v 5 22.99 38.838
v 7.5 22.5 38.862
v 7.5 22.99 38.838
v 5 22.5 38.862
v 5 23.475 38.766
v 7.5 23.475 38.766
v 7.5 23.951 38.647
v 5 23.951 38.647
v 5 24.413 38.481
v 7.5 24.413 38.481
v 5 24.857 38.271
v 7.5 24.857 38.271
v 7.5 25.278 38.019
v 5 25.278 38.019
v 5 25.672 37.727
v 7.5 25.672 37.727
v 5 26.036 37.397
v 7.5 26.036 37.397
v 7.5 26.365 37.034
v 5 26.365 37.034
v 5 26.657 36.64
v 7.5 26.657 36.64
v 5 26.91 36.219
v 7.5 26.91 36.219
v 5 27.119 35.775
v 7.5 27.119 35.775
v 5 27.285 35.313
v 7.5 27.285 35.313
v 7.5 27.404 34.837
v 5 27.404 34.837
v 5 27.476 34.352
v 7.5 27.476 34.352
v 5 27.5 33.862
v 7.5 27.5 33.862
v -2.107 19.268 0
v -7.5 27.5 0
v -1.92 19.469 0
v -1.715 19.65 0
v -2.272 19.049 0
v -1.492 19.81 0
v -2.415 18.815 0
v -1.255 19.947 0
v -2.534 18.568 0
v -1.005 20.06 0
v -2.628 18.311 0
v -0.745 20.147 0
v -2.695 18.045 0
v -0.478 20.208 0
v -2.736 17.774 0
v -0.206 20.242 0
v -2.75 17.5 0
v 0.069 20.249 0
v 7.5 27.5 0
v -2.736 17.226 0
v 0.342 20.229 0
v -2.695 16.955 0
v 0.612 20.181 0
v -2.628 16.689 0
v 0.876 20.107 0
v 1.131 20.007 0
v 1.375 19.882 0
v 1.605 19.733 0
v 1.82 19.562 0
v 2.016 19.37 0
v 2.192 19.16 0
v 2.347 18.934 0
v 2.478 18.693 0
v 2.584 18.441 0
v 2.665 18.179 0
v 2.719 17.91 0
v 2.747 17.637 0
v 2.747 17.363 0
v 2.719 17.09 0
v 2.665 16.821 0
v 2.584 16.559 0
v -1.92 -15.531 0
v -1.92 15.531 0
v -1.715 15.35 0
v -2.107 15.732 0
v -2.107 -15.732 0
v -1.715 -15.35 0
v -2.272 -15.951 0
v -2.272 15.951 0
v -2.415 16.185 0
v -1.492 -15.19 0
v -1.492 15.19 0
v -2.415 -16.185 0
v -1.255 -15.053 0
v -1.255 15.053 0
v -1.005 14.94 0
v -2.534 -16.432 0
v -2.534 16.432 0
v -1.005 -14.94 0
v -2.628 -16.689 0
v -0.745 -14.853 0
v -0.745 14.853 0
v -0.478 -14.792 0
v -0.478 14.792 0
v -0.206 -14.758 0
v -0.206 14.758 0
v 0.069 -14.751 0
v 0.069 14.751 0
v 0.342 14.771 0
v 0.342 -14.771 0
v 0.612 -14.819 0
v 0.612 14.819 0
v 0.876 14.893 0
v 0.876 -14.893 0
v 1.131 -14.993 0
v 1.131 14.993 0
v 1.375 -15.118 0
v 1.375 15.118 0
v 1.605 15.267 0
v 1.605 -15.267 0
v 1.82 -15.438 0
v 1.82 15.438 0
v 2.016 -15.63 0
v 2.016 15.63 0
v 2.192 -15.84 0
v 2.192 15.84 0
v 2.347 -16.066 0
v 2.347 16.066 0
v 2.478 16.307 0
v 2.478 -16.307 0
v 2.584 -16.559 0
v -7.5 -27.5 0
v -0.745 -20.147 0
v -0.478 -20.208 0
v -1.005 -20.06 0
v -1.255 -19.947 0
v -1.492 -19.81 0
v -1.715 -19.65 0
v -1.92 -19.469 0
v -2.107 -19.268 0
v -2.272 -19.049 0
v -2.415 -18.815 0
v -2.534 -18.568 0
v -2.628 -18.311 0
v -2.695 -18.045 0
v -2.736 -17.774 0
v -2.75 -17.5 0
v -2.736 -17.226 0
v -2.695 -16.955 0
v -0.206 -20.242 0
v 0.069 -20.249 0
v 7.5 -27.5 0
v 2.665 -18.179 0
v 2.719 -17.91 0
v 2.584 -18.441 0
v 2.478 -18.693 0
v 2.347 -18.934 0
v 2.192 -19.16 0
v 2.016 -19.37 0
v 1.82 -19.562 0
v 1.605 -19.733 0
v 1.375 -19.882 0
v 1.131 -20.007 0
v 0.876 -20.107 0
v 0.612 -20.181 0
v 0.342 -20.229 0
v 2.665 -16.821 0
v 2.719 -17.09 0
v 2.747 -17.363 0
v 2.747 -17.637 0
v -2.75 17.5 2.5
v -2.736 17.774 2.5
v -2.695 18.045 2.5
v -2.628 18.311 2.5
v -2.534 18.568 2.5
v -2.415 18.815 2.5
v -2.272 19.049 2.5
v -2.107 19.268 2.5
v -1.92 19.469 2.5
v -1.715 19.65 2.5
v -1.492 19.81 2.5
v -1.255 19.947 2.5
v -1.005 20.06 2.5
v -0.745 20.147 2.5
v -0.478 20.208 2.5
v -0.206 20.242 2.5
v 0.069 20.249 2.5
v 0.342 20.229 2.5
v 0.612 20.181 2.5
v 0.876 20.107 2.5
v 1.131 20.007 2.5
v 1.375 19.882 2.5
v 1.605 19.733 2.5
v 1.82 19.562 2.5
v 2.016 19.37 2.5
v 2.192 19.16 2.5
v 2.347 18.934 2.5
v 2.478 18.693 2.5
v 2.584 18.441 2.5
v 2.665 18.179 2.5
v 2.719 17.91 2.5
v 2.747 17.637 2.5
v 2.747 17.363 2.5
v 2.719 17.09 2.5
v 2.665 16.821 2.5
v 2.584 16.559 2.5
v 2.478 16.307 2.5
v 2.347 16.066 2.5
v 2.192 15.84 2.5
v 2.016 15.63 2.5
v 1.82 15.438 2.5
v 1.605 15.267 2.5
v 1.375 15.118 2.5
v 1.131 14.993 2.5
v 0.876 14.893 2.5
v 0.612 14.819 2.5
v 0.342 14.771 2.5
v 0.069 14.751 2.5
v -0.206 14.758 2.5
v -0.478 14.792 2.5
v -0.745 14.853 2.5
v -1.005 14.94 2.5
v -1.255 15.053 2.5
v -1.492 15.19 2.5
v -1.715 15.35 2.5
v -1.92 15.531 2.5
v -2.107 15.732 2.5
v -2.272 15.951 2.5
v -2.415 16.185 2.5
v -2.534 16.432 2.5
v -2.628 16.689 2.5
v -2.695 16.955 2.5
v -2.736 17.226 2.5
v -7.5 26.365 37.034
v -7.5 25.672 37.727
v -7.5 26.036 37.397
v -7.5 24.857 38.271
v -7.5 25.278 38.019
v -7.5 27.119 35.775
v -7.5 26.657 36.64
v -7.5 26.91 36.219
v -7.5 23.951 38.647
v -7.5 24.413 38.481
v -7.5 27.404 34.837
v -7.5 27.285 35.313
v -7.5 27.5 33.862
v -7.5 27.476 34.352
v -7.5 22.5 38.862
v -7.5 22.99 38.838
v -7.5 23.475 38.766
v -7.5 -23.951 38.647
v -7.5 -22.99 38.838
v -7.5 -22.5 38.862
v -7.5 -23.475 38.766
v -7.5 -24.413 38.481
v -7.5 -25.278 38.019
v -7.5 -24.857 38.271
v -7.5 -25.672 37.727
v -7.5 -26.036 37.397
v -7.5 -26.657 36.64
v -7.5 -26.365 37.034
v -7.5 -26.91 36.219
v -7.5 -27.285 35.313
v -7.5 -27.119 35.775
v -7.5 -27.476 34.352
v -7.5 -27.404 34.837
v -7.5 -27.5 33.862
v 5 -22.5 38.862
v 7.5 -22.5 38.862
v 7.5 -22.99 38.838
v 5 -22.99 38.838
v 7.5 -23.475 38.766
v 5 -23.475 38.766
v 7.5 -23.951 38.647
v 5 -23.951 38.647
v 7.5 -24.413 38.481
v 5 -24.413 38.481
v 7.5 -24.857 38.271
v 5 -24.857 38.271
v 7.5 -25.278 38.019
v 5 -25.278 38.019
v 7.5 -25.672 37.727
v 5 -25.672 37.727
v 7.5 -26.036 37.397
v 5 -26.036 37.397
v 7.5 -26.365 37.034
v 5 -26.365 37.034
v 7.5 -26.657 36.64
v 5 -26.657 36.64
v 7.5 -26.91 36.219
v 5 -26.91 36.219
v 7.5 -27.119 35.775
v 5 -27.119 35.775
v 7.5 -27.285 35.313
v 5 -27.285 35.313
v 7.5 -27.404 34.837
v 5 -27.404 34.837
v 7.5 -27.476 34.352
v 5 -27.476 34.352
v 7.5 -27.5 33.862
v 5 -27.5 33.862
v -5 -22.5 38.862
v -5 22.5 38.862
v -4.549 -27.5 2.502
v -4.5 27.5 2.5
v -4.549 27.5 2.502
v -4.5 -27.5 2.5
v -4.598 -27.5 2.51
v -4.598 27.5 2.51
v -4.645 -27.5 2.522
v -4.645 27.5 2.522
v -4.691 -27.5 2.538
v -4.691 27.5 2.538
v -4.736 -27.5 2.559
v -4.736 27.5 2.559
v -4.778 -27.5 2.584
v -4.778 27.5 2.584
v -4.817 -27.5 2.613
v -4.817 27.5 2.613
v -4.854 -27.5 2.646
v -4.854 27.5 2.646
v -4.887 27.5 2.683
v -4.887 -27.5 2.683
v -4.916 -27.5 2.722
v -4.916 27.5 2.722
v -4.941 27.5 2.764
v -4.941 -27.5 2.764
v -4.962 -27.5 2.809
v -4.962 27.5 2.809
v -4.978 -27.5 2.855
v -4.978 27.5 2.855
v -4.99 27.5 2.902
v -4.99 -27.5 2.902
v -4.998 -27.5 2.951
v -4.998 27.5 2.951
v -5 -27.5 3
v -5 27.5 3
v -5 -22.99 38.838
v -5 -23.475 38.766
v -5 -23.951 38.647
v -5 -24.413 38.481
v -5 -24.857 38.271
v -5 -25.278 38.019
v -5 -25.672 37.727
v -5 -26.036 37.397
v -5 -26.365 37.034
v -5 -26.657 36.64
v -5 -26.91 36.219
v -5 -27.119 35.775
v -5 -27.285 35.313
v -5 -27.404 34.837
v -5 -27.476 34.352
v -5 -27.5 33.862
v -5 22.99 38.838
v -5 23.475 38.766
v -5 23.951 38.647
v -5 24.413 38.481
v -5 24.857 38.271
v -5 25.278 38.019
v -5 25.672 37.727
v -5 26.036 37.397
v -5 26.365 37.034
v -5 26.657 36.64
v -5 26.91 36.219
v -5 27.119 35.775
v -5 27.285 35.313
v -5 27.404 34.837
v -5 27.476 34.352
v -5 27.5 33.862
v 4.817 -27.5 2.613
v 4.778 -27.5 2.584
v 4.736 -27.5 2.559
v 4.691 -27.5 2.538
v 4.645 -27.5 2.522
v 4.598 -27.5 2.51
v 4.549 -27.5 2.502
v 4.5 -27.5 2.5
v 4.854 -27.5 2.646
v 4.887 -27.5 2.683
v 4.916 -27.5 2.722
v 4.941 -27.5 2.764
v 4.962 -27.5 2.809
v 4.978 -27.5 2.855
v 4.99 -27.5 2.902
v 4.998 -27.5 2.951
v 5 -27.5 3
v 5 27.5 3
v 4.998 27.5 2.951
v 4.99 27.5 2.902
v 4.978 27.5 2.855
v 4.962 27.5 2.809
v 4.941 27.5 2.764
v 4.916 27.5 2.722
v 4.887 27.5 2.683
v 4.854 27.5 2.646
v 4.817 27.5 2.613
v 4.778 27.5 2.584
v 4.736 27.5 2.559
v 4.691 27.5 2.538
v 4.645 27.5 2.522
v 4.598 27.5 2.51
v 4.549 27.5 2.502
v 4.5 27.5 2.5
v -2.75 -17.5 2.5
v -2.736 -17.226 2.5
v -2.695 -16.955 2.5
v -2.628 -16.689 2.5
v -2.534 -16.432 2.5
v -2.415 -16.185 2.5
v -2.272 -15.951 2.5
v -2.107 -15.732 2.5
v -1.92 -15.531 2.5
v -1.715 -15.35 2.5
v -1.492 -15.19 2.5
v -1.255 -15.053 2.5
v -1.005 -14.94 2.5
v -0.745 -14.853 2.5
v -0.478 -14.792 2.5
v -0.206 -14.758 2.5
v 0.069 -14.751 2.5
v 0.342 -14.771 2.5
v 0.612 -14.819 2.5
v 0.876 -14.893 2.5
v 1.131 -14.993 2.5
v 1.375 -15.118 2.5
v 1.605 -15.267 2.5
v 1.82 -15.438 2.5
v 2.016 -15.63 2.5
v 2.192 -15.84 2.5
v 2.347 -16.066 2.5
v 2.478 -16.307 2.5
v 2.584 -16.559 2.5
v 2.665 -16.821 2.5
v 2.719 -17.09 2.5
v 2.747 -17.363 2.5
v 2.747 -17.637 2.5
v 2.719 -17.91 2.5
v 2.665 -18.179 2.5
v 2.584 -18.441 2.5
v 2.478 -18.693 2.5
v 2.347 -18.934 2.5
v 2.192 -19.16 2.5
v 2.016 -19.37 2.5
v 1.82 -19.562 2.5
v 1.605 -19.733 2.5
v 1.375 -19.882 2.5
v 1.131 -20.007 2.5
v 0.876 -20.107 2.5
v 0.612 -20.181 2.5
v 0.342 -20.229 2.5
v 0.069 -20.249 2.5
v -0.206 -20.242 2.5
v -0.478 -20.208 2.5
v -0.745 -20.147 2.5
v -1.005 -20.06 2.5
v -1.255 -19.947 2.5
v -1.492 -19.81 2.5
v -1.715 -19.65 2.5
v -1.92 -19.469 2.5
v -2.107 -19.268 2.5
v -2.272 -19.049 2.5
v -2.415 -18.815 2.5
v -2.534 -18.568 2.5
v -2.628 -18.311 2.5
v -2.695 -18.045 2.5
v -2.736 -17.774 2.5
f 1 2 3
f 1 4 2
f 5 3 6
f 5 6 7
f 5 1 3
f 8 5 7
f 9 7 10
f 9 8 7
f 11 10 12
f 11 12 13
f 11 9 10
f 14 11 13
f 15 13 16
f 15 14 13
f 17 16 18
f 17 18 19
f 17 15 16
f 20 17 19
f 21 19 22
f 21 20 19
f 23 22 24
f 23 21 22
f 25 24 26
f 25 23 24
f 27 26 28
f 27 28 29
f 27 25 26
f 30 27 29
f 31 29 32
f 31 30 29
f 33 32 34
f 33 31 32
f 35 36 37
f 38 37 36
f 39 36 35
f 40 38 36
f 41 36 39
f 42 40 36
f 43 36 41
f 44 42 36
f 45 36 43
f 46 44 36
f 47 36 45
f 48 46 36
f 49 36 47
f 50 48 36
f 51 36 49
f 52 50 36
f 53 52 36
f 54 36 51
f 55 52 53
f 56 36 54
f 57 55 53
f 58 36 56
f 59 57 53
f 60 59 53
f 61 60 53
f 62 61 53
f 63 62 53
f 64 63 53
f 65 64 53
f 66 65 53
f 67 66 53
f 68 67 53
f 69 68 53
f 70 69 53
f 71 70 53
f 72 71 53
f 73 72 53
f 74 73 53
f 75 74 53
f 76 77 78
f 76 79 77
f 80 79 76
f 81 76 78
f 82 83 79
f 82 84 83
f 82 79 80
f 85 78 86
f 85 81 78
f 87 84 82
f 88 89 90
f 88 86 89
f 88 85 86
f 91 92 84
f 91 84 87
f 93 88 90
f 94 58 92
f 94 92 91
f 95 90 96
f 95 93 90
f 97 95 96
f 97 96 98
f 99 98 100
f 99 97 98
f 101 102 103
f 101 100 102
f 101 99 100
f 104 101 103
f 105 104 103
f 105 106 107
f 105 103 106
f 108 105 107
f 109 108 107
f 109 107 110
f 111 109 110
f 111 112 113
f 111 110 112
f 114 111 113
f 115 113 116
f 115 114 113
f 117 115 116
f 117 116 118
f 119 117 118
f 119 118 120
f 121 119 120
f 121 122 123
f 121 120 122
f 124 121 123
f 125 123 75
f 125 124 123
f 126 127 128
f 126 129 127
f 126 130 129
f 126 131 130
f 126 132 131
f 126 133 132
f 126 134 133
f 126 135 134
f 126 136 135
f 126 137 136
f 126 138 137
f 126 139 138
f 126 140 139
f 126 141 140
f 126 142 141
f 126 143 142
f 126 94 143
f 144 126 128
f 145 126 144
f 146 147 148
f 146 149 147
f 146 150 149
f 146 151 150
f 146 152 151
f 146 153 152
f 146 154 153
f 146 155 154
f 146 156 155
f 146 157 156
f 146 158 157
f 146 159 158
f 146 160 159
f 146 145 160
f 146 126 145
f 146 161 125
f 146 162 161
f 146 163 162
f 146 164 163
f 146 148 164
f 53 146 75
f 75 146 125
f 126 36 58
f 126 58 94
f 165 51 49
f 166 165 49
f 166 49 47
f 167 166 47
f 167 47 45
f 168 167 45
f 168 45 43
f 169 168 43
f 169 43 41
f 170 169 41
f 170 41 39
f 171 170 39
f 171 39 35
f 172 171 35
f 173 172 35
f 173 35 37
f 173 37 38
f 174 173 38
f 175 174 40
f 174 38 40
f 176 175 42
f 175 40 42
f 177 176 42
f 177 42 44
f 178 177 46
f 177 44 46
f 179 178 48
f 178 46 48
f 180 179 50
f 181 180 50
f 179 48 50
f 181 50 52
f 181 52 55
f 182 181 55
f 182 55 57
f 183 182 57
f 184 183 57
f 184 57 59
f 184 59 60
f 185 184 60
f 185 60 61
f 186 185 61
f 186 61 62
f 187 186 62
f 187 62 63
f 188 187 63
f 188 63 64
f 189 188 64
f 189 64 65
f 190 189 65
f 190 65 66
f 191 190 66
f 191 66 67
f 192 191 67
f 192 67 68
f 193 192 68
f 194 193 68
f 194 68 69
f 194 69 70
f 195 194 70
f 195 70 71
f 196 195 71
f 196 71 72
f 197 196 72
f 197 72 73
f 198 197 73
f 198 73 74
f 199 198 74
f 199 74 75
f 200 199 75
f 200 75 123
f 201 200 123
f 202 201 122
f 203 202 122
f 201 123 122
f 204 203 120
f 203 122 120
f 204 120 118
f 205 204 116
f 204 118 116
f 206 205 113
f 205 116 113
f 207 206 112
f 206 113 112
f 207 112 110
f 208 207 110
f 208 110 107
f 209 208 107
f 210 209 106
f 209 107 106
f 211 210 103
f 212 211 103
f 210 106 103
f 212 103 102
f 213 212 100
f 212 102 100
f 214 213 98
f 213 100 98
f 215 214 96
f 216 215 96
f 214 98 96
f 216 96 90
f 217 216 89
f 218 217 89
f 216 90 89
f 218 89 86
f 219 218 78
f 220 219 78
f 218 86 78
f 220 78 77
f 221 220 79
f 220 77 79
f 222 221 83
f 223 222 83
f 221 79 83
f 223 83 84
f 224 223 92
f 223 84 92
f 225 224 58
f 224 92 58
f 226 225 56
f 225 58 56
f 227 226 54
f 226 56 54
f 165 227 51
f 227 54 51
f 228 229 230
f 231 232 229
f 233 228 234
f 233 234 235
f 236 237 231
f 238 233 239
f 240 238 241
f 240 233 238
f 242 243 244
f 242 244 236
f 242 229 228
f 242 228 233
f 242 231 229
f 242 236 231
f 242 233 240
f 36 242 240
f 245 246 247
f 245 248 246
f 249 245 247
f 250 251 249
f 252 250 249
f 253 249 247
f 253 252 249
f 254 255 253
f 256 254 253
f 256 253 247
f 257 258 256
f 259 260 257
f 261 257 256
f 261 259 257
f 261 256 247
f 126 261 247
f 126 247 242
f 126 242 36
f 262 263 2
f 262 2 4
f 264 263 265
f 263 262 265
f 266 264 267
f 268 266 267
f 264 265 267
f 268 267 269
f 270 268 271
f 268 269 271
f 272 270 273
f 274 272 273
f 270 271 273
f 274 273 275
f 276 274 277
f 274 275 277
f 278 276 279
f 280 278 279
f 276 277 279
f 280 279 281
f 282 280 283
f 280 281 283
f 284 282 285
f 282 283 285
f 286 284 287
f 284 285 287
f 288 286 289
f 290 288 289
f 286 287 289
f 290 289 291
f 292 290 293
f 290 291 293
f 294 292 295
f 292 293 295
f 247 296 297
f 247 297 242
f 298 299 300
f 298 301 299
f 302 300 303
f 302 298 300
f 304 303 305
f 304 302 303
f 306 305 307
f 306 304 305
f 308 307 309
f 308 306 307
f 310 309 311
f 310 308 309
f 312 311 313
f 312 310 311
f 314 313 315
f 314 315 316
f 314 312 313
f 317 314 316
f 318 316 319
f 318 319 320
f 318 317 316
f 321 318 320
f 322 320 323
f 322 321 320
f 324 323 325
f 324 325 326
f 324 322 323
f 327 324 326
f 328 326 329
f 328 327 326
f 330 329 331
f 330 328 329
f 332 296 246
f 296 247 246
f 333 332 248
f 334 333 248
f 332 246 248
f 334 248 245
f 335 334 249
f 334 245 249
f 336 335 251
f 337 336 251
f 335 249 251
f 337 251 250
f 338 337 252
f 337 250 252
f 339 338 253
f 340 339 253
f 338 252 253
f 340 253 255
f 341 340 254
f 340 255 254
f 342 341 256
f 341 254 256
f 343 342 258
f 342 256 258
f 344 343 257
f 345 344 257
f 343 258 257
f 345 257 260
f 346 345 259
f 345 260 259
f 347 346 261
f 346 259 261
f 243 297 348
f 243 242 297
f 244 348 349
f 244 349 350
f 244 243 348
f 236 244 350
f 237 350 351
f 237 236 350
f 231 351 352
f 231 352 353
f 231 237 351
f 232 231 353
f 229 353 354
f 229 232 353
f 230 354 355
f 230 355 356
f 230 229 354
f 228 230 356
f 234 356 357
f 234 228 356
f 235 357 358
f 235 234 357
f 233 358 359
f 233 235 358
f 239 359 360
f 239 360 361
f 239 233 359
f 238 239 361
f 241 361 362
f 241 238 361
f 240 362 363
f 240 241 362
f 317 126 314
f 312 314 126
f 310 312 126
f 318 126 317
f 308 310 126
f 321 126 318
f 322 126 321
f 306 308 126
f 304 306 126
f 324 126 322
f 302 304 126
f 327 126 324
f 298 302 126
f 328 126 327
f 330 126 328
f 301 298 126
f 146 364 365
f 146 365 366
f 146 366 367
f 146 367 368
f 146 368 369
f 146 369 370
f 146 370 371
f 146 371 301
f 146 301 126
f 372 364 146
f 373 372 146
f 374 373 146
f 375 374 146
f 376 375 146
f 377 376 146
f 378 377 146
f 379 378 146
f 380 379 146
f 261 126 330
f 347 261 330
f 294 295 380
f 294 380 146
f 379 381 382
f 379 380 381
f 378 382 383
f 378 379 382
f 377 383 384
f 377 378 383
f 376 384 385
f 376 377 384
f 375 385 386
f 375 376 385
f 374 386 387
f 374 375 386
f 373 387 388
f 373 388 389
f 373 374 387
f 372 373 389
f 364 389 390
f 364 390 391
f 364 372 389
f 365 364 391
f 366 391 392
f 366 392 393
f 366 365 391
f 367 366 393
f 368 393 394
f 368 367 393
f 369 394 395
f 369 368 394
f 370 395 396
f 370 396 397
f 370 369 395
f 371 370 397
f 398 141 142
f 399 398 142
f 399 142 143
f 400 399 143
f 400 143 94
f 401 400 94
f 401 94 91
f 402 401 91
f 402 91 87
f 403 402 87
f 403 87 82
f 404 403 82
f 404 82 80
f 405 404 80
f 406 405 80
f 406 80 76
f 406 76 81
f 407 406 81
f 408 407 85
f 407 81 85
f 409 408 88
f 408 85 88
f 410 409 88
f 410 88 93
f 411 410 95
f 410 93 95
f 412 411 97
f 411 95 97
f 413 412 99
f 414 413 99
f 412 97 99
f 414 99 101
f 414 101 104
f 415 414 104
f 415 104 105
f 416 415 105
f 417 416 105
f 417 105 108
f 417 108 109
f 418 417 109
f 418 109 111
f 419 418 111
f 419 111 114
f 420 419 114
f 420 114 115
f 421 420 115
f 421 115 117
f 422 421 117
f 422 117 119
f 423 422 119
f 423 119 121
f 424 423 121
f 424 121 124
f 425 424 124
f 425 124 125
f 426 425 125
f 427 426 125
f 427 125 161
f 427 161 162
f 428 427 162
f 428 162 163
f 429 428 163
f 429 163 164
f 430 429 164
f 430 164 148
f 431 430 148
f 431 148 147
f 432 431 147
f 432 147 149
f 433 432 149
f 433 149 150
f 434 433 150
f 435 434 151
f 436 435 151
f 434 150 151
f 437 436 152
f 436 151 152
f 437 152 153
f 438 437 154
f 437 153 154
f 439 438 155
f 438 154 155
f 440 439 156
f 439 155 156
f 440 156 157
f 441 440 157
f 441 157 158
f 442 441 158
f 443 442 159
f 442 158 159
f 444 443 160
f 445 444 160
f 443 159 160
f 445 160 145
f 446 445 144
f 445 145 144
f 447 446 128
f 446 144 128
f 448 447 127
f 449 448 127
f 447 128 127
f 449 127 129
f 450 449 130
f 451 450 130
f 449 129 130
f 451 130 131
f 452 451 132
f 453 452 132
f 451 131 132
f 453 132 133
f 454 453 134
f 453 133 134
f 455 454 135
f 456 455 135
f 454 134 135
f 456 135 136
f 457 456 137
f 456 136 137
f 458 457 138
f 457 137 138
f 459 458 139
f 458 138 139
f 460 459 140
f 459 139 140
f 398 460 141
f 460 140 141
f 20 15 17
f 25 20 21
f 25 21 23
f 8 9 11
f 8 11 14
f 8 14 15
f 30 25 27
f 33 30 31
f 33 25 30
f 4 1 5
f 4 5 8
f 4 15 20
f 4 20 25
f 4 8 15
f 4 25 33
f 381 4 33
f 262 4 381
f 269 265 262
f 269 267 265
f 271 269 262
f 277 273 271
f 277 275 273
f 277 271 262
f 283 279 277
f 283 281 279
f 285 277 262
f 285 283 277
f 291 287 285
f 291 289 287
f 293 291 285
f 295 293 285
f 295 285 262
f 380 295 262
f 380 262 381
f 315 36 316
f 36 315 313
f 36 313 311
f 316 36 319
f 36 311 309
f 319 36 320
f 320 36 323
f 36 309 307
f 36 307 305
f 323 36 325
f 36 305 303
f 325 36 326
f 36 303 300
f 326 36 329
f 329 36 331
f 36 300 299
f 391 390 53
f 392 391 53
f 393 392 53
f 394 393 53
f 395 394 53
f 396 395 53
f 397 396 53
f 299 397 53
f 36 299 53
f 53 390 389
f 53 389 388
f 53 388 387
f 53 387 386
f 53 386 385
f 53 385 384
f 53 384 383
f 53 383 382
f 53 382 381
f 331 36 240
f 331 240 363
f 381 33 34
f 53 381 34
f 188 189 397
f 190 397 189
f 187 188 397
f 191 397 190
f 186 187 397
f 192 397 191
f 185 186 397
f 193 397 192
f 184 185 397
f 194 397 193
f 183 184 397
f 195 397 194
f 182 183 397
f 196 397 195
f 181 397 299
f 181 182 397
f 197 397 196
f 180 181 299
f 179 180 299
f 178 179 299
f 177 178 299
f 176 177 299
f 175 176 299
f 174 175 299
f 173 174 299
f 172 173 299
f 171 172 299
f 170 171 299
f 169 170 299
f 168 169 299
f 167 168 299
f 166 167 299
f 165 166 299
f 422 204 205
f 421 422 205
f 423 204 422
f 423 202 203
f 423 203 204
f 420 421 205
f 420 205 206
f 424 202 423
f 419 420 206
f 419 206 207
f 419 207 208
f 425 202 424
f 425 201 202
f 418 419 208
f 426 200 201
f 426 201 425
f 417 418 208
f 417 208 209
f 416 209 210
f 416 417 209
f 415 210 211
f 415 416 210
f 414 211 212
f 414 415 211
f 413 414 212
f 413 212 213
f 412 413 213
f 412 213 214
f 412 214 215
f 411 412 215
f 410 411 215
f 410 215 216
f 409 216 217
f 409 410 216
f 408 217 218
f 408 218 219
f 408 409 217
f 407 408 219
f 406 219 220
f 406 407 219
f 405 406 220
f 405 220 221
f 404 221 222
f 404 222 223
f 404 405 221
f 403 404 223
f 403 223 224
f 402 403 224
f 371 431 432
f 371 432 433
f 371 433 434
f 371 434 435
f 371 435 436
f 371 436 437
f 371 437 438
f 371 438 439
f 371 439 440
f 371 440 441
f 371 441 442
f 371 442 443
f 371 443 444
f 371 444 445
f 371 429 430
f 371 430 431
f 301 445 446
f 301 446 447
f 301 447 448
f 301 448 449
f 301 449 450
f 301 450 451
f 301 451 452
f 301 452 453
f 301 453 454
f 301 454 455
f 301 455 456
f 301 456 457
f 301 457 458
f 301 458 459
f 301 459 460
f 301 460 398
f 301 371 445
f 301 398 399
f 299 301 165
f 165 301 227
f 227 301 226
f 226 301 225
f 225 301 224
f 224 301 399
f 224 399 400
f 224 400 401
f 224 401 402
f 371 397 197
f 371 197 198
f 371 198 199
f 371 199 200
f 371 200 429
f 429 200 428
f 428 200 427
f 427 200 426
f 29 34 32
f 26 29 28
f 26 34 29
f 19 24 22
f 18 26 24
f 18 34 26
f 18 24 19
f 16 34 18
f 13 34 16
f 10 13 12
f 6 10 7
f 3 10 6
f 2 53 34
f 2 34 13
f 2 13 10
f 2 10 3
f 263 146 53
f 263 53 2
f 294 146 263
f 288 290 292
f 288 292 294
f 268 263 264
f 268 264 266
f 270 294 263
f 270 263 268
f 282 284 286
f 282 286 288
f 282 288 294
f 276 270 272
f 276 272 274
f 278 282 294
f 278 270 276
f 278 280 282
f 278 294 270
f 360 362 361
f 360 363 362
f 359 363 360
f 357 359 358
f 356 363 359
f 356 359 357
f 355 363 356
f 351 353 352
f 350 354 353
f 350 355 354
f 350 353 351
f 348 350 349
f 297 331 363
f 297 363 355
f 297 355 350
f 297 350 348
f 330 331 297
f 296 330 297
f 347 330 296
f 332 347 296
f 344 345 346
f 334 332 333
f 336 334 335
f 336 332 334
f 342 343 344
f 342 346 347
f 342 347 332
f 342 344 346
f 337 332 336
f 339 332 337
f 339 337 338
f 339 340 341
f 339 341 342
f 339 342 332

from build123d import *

# Parameters (mm, degrees)
F1_DEPTH = 27.5
F2_R     = 5
F3_R     = 0.5
F5_D     = 5.5


with BuildPart() as f1:
    # F0 (on Front) → F1 (new body, symmetric)
    with BuildSketch(Plane.XZ):
        Polygon((-7.5, 0), (0, 0), (7.5, 0), (7.5, 38.8618100292), (5, 38.8618100292), (5, 2.5), (-5, 2.5), (-5, 38.8618100292), (-7.5, 38.8618100292), align=None)
    extrude(amount=F1_DEPTH, both=True)

    # F2
    f2_edges = [f1.edges().sort_by_distance(p)[0] for p in [
        (6.25, -27.5, 38.86181),
        (-6.25, -27.5, 38.86181),
        (6.25, 27.5, 38.86181),
        (-6.25, 27.5, 38.86181),
    ]]
    fillet(f2_edges, radius=F2_R)

    # F3
    f3_edges = [f1.edges().sort_by_distance(p)[0] for p in [
        (-5, 0, 2.5),
        (5, 0, 2.5),
    ]]
    fillet(f3_edges, radius=F3_R)

    # F5 (through all)
    with Locations(Plane.XY.offset(2.5)):
        with Locations((0, 17.5), (0, -17.5)):
            Hole(F5_D / 2)


solid = f1.part
